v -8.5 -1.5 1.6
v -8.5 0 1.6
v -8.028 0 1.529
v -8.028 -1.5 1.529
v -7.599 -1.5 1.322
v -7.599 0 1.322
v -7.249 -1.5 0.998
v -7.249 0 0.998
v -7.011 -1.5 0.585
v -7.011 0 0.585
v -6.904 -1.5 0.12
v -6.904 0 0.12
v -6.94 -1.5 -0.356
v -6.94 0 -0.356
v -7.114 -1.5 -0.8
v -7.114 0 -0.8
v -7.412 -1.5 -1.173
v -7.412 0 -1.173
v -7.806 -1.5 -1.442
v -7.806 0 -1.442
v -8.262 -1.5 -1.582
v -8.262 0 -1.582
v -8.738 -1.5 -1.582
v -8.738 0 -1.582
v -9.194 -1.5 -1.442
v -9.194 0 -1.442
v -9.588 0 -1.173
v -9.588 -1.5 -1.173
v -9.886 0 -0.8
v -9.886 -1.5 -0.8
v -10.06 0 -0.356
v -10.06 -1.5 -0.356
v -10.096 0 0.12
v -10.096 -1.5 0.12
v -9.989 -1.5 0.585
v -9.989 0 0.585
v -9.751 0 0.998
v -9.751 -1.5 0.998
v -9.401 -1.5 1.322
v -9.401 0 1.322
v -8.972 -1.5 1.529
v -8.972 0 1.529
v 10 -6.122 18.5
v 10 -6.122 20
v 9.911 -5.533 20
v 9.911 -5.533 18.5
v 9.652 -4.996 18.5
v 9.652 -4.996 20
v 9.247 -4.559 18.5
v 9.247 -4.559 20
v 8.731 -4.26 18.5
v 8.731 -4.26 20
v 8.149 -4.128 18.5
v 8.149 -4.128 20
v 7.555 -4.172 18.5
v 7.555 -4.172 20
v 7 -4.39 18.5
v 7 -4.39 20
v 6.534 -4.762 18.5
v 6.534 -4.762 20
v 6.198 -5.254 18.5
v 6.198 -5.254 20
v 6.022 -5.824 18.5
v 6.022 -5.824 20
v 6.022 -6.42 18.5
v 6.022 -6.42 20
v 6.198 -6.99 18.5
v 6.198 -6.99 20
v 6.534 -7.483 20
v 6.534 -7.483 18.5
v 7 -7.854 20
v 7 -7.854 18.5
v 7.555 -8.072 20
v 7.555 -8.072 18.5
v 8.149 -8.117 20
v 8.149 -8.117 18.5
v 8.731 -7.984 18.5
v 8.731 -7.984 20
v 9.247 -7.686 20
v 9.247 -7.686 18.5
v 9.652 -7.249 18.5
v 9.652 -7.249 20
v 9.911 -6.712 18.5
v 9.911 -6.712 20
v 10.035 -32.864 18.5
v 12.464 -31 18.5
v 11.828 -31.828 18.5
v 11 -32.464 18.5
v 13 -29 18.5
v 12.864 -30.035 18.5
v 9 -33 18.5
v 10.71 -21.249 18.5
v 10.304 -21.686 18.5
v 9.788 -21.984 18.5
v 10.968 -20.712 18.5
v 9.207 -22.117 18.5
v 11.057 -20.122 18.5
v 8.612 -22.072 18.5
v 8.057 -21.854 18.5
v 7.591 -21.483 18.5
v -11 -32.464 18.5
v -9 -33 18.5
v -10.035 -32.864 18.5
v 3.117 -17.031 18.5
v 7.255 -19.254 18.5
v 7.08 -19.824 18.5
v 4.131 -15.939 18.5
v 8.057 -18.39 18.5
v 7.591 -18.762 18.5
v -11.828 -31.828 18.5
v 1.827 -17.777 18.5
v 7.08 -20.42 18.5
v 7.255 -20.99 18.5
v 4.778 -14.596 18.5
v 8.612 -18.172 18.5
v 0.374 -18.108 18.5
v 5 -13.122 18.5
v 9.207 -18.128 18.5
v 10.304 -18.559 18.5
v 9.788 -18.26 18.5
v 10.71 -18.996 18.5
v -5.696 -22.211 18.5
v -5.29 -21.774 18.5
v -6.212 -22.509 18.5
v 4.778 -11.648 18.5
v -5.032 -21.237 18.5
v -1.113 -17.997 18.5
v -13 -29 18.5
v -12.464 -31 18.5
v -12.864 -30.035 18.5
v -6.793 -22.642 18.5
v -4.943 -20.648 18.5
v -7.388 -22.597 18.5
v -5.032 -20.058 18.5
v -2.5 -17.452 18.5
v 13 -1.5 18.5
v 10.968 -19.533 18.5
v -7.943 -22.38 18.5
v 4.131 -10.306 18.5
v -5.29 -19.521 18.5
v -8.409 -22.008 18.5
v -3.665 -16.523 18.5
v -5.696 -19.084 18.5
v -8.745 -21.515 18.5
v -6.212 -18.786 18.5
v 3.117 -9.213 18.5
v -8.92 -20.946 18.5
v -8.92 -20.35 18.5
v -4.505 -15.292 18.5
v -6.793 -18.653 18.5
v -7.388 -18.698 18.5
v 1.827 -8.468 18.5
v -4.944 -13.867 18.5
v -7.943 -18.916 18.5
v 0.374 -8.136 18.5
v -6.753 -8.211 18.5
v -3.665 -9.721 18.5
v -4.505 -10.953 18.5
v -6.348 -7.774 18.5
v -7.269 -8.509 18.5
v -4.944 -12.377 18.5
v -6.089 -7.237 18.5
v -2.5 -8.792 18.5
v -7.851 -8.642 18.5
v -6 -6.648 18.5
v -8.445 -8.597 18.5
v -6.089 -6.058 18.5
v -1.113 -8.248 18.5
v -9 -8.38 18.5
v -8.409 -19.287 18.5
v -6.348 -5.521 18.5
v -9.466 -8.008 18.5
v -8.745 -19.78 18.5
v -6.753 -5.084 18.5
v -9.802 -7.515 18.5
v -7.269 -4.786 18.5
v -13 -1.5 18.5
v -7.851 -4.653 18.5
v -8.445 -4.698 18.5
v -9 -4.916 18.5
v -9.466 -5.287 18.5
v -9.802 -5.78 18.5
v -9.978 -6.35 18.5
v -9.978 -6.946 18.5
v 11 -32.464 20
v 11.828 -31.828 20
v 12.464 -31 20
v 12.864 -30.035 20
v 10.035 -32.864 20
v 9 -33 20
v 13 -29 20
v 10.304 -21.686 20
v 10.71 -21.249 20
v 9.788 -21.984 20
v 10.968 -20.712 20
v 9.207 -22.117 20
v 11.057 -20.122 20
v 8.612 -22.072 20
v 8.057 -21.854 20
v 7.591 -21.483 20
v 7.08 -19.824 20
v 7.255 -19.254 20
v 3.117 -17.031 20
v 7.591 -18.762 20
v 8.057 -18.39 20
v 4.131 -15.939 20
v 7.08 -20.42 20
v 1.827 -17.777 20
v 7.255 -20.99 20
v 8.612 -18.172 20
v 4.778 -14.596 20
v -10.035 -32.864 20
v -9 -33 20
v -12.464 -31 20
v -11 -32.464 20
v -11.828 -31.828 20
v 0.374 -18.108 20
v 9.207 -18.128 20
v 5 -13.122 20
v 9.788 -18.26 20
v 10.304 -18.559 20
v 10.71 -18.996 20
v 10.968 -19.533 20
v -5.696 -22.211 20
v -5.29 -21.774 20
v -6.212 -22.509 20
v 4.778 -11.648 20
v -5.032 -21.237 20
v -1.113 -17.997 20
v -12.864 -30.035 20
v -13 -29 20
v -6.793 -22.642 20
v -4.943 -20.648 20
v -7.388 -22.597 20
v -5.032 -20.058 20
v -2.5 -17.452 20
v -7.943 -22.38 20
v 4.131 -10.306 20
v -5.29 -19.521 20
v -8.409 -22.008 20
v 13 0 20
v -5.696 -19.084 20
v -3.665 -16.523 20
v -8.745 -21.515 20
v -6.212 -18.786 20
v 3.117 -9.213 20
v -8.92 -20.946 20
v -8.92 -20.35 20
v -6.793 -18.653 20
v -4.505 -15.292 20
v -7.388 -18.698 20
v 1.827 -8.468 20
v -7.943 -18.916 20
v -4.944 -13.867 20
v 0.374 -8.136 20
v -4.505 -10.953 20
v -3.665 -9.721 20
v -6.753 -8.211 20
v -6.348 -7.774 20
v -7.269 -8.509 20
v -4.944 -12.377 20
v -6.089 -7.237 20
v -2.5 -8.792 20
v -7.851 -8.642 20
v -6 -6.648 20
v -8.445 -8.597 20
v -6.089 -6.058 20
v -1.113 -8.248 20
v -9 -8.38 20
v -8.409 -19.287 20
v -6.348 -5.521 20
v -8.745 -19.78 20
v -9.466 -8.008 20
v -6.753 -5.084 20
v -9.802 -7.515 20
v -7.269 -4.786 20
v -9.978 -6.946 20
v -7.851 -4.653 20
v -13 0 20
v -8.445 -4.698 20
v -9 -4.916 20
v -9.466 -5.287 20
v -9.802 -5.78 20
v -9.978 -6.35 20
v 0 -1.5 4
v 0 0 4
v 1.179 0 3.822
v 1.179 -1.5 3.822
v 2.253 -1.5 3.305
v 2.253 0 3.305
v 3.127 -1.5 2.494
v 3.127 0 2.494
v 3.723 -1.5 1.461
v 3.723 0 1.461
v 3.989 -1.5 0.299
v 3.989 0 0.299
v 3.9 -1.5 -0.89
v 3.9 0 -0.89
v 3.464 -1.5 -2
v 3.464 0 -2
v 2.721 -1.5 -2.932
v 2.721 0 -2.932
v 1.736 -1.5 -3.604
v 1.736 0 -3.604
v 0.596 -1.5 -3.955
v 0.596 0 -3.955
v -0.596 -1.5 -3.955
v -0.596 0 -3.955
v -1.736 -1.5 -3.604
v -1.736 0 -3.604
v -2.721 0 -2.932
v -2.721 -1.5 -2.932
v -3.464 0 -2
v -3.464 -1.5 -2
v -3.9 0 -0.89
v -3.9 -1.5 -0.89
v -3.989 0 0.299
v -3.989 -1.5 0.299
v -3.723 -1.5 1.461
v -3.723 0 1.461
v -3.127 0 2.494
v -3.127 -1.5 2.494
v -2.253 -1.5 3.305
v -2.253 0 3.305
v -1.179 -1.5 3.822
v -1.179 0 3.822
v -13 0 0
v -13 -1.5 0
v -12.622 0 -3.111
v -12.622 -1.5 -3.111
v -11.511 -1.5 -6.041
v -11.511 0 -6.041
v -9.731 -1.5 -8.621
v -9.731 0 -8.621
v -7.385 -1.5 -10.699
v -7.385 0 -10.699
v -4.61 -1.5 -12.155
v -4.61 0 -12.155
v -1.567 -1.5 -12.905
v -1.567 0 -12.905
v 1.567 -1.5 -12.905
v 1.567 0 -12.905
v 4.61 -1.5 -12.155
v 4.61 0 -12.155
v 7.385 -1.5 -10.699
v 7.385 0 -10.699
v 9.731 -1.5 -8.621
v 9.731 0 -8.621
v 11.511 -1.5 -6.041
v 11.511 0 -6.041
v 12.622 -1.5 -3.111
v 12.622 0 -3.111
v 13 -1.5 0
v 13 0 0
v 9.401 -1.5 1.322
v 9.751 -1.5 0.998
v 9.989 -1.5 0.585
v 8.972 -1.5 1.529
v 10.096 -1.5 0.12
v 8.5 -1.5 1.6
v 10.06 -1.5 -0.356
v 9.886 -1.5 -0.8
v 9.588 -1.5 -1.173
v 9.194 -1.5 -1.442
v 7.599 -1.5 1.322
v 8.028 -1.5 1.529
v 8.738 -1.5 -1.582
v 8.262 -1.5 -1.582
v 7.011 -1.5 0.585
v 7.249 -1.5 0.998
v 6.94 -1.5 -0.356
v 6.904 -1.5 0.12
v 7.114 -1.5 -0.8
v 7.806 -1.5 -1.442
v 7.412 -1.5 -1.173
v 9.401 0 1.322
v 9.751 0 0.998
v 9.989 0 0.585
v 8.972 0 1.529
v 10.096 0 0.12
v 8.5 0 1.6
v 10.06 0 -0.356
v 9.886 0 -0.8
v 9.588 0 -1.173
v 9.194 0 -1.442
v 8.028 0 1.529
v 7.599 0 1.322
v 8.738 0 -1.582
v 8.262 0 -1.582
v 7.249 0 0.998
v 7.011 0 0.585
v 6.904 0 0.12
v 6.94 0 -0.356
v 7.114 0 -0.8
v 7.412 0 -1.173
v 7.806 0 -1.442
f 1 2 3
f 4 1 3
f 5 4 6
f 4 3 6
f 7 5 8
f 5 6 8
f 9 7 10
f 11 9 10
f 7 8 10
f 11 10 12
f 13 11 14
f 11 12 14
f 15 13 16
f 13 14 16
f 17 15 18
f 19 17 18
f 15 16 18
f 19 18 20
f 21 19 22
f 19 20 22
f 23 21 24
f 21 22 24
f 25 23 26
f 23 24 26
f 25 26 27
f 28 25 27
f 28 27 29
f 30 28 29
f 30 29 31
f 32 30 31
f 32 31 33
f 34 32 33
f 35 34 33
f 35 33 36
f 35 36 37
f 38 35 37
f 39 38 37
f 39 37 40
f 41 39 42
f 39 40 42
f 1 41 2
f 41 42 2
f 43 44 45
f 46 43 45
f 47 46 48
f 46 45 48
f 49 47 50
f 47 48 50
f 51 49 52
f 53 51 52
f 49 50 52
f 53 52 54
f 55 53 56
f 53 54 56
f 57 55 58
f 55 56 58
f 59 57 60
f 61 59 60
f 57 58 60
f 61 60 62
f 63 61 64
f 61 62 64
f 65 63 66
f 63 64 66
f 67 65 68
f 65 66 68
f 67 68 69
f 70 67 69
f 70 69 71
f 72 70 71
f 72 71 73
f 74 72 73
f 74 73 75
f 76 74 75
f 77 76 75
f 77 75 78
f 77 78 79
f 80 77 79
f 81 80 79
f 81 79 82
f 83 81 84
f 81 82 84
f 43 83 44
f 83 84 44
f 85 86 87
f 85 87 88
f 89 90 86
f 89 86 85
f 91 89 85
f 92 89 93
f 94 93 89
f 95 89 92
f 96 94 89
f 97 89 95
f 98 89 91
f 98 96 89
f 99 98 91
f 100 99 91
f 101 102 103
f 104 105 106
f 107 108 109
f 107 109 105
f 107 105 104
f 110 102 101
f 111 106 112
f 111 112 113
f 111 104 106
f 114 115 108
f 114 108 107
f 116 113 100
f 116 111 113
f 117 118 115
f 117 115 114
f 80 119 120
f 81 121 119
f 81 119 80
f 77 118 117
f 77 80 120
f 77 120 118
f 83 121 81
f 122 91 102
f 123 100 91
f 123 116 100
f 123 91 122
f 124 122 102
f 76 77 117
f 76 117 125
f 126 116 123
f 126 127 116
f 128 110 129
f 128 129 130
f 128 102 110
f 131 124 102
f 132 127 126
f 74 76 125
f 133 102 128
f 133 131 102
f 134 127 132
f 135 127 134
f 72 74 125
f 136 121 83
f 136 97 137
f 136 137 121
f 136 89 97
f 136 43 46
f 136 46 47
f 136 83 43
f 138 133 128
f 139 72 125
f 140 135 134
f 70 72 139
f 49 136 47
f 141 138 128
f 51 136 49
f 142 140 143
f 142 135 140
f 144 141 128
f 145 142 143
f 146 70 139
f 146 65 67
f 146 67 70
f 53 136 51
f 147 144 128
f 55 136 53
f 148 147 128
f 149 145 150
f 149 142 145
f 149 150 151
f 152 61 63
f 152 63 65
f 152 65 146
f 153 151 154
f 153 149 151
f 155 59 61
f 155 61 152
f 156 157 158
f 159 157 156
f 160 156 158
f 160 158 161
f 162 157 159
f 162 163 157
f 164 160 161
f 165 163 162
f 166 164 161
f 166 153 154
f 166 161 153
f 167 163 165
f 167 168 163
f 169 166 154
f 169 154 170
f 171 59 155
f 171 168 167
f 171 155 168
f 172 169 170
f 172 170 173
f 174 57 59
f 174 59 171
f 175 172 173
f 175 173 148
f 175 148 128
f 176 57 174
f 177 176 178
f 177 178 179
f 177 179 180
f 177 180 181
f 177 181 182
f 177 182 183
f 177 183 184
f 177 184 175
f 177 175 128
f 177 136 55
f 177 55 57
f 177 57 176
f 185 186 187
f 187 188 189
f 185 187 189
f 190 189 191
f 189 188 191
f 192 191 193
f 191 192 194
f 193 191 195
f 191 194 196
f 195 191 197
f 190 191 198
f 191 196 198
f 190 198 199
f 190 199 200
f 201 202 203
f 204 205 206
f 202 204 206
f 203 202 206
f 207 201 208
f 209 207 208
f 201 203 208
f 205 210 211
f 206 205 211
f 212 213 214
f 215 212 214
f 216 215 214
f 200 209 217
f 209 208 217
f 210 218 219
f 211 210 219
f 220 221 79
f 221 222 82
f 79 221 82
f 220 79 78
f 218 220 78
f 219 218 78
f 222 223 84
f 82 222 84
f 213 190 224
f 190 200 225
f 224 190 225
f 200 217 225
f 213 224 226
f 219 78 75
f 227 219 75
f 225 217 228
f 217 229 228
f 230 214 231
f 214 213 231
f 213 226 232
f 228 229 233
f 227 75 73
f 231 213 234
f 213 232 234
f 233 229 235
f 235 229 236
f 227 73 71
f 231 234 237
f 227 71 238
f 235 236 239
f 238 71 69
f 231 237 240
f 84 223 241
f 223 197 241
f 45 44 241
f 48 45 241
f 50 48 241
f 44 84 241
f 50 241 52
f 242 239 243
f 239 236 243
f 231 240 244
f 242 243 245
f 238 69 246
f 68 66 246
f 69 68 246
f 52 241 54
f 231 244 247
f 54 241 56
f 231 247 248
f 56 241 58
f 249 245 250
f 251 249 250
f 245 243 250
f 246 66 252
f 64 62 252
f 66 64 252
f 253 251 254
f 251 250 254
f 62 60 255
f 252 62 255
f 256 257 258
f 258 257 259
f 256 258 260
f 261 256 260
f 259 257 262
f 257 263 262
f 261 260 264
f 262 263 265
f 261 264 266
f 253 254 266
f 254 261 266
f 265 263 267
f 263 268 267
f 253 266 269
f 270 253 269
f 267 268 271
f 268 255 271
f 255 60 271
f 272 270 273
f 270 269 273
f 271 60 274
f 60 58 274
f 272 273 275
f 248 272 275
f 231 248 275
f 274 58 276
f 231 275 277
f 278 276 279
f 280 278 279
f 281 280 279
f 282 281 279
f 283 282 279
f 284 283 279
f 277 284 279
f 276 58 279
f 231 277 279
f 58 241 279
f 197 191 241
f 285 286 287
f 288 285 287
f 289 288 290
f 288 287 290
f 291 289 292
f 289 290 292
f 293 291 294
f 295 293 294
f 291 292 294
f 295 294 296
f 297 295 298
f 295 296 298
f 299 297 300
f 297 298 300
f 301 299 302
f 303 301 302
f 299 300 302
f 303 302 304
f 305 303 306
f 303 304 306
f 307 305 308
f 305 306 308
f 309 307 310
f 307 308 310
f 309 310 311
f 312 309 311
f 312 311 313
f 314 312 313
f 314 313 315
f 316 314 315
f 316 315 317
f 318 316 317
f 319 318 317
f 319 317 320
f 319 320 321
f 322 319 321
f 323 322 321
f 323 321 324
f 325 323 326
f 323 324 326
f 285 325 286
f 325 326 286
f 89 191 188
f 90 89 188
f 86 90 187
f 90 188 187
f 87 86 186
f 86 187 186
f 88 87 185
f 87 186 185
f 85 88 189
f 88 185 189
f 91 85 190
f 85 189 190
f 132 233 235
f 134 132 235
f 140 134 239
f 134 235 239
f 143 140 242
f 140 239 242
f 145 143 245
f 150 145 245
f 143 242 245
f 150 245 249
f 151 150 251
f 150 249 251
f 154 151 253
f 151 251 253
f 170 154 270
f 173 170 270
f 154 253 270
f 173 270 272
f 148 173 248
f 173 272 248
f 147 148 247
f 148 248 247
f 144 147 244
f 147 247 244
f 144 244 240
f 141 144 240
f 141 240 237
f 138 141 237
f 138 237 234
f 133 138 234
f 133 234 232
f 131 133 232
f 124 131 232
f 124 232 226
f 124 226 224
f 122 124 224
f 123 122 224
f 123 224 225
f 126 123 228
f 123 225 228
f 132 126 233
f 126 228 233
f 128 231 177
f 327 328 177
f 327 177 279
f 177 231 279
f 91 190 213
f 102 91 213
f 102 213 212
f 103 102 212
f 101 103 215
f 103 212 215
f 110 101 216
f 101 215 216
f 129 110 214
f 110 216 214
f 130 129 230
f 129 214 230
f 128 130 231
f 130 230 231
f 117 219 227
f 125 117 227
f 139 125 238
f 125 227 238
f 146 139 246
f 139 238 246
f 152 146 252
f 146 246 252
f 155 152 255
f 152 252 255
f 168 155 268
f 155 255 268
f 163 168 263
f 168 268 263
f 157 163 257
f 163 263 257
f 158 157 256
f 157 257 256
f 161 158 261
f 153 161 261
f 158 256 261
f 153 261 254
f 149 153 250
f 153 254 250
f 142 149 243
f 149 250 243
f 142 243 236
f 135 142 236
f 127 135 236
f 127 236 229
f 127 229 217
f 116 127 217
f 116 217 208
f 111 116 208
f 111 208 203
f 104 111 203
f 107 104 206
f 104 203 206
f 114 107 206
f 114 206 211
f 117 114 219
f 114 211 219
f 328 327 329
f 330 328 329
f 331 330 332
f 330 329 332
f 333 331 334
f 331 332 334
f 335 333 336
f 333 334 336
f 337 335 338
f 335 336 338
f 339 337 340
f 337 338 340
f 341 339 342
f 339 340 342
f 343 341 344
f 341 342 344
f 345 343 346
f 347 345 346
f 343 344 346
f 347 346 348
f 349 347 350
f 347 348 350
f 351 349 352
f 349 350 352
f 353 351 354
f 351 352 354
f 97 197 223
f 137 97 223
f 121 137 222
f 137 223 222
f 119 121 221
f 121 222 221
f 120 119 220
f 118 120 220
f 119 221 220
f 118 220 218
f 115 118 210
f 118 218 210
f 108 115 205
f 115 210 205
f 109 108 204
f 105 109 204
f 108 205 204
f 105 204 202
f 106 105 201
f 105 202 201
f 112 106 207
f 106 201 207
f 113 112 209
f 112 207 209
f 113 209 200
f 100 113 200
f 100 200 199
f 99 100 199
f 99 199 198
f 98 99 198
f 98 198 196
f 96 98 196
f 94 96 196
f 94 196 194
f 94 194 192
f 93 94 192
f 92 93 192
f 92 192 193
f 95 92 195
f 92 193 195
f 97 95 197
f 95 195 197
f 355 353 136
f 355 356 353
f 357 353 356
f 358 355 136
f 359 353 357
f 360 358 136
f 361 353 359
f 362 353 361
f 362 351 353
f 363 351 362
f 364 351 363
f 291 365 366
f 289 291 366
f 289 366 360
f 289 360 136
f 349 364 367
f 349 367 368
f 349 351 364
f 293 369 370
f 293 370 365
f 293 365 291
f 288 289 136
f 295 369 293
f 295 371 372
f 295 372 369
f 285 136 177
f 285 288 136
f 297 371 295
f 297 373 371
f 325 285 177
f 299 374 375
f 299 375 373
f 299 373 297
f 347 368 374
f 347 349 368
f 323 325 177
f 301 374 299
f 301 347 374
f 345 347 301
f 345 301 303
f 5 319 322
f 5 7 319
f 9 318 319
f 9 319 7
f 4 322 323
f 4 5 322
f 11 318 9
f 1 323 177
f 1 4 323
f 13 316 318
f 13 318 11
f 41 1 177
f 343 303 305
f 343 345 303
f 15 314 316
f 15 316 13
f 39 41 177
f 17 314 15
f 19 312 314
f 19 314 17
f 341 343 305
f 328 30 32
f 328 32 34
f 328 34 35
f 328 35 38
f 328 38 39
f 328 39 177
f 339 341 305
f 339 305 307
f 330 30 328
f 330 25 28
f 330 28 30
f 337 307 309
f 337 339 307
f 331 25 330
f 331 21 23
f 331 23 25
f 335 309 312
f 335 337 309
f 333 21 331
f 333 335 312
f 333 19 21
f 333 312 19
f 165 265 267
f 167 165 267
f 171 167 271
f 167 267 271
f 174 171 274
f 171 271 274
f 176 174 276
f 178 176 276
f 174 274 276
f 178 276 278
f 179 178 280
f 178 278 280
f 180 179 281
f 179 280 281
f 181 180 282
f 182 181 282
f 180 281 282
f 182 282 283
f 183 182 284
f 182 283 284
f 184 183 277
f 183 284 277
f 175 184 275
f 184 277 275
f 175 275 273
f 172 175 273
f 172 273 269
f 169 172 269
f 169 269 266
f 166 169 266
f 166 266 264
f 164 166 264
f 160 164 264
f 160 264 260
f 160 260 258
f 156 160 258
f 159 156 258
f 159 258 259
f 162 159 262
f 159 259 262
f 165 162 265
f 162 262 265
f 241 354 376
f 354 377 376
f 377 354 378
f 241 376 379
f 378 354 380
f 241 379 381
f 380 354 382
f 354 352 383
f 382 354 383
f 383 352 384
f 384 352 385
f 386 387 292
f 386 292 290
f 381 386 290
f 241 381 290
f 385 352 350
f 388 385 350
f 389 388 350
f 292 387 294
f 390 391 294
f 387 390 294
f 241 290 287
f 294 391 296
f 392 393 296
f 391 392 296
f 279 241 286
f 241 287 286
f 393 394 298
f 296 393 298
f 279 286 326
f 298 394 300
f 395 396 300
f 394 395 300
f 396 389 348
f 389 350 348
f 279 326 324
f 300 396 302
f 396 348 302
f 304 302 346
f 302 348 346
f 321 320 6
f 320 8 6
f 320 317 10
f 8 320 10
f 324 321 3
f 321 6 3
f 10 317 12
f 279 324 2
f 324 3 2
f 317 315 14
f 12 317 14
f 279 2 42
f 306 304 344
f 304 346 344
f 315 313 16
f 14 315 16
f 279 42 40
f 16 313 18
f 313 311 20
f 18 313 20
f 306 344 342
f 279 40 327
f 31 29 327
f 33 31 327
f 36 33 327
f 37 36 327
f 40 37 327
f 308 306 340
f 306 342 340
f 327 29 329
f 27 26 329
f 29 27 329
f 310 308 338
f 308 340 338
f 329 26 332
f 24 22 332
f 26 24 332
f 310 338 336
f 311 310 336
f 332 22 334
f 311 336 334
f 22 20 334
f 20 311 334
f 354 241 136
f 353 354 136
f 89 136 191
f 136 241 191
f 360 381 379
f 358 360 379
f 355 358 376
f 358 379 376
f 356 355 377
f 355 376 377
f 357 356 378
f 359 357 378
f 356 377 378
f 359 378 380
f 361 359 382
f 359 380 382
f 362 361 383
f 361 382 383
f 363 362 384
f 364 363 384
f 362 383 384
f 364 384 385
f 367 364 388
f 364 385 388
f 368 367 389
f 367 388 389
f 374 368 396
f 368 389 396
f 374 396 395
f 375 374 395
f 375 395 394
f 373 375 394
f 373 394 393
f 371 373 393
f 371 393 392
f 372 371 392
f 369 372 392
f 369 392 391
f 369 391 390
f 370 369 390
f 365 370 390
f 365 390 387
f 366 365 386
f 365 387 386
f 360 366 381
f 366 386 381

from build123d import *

# Parameters (mm, degrees)
SKETCH1_R           = 4
SKETCH1_R_2         = 1.6
BOSS_EXTRUDE1_DEPTH = 1.5
SKETCH2_R           = 5
SKETCH2_R_2         = 2
BOSS_EXTRUDE2_DEPTH = 1.5


with BuildPart() as part:
    # Sketch1 → Boss-Extrude1 (new body)
    with BuildSketch(Plane(origin=(0, 0, 0), x_dir=(1, 0, 0), z_dir=(0, 1, 0))):
        with BuildLine():
            Line((-13, -20), (-13, 0))
            ThreePointArc((-13, 0), (0, 13), (13, 0))
            Line((13, 0), (13, -20))
            Line((13, -20), (-13, -20))
        make_face()
        with Locations(Location((0, 0, 0), (0, 0, 270))):
            Circle(SKETCH1_R, mode=Mode.SUBTRACT)
        with Locations(Location((8.5, 0, 0), (0, 0, 270))):
            Circle(SKETCH1_R_2, mode=Mode.SUBTRACT)
        with Locations(Location((-8.5, 0, 0), (0, 0, 270))):
            Circle(SKETCH1_R_2, mode=Mode.SUBTRACT)
    extrude(amount=-BOSS_EXTRUDE1_DEPTH)

    # Sketch2 → Boss-Extrude2 (add)
    with BuildSketch(Plane.XY.offset(20)):
        with BuildLine():
            Line((13, -1.5), (13, -29))
            ThreePointArc((13, -29), (11.828427125, -31.828427125), (9, -33))
            Line((9, -33), (-9, -33))
            ThreePointArc((-9, -33), (-11.828427125, -31.828427125), (-13, -29))
            Line((-13, -29), (-13, -1.5))
            Line((-13, -1.5), (13, -1.5))
        make_face()
        with Locations((0, -13.122230355)):
            Circle(SKETCH2_R, mode=Mode.SUBTRACT)
        with Locations((8, -6.122230355)):
            Circle(SKETCH2_R_2, mode=Mode.SUBTRACT)
        with Locations((-8, -6.647631856)):
            Circle(SKETCH2_R_2, mode=Mode.SUBTRACT)
        with Locations((-6.942675301, -20.647631856)):
            Circle(SKETCH2_R_2, mode=Mode.SUBTRACT)
        with Locations((9.057324699, -20.122230355)):
            Circle(SKETCH2_R_2, mode=Mode.SUBTRACT)
    extrude(amount=-BOSS_EXTRUDE2_DEPTH)


solid = part.part
